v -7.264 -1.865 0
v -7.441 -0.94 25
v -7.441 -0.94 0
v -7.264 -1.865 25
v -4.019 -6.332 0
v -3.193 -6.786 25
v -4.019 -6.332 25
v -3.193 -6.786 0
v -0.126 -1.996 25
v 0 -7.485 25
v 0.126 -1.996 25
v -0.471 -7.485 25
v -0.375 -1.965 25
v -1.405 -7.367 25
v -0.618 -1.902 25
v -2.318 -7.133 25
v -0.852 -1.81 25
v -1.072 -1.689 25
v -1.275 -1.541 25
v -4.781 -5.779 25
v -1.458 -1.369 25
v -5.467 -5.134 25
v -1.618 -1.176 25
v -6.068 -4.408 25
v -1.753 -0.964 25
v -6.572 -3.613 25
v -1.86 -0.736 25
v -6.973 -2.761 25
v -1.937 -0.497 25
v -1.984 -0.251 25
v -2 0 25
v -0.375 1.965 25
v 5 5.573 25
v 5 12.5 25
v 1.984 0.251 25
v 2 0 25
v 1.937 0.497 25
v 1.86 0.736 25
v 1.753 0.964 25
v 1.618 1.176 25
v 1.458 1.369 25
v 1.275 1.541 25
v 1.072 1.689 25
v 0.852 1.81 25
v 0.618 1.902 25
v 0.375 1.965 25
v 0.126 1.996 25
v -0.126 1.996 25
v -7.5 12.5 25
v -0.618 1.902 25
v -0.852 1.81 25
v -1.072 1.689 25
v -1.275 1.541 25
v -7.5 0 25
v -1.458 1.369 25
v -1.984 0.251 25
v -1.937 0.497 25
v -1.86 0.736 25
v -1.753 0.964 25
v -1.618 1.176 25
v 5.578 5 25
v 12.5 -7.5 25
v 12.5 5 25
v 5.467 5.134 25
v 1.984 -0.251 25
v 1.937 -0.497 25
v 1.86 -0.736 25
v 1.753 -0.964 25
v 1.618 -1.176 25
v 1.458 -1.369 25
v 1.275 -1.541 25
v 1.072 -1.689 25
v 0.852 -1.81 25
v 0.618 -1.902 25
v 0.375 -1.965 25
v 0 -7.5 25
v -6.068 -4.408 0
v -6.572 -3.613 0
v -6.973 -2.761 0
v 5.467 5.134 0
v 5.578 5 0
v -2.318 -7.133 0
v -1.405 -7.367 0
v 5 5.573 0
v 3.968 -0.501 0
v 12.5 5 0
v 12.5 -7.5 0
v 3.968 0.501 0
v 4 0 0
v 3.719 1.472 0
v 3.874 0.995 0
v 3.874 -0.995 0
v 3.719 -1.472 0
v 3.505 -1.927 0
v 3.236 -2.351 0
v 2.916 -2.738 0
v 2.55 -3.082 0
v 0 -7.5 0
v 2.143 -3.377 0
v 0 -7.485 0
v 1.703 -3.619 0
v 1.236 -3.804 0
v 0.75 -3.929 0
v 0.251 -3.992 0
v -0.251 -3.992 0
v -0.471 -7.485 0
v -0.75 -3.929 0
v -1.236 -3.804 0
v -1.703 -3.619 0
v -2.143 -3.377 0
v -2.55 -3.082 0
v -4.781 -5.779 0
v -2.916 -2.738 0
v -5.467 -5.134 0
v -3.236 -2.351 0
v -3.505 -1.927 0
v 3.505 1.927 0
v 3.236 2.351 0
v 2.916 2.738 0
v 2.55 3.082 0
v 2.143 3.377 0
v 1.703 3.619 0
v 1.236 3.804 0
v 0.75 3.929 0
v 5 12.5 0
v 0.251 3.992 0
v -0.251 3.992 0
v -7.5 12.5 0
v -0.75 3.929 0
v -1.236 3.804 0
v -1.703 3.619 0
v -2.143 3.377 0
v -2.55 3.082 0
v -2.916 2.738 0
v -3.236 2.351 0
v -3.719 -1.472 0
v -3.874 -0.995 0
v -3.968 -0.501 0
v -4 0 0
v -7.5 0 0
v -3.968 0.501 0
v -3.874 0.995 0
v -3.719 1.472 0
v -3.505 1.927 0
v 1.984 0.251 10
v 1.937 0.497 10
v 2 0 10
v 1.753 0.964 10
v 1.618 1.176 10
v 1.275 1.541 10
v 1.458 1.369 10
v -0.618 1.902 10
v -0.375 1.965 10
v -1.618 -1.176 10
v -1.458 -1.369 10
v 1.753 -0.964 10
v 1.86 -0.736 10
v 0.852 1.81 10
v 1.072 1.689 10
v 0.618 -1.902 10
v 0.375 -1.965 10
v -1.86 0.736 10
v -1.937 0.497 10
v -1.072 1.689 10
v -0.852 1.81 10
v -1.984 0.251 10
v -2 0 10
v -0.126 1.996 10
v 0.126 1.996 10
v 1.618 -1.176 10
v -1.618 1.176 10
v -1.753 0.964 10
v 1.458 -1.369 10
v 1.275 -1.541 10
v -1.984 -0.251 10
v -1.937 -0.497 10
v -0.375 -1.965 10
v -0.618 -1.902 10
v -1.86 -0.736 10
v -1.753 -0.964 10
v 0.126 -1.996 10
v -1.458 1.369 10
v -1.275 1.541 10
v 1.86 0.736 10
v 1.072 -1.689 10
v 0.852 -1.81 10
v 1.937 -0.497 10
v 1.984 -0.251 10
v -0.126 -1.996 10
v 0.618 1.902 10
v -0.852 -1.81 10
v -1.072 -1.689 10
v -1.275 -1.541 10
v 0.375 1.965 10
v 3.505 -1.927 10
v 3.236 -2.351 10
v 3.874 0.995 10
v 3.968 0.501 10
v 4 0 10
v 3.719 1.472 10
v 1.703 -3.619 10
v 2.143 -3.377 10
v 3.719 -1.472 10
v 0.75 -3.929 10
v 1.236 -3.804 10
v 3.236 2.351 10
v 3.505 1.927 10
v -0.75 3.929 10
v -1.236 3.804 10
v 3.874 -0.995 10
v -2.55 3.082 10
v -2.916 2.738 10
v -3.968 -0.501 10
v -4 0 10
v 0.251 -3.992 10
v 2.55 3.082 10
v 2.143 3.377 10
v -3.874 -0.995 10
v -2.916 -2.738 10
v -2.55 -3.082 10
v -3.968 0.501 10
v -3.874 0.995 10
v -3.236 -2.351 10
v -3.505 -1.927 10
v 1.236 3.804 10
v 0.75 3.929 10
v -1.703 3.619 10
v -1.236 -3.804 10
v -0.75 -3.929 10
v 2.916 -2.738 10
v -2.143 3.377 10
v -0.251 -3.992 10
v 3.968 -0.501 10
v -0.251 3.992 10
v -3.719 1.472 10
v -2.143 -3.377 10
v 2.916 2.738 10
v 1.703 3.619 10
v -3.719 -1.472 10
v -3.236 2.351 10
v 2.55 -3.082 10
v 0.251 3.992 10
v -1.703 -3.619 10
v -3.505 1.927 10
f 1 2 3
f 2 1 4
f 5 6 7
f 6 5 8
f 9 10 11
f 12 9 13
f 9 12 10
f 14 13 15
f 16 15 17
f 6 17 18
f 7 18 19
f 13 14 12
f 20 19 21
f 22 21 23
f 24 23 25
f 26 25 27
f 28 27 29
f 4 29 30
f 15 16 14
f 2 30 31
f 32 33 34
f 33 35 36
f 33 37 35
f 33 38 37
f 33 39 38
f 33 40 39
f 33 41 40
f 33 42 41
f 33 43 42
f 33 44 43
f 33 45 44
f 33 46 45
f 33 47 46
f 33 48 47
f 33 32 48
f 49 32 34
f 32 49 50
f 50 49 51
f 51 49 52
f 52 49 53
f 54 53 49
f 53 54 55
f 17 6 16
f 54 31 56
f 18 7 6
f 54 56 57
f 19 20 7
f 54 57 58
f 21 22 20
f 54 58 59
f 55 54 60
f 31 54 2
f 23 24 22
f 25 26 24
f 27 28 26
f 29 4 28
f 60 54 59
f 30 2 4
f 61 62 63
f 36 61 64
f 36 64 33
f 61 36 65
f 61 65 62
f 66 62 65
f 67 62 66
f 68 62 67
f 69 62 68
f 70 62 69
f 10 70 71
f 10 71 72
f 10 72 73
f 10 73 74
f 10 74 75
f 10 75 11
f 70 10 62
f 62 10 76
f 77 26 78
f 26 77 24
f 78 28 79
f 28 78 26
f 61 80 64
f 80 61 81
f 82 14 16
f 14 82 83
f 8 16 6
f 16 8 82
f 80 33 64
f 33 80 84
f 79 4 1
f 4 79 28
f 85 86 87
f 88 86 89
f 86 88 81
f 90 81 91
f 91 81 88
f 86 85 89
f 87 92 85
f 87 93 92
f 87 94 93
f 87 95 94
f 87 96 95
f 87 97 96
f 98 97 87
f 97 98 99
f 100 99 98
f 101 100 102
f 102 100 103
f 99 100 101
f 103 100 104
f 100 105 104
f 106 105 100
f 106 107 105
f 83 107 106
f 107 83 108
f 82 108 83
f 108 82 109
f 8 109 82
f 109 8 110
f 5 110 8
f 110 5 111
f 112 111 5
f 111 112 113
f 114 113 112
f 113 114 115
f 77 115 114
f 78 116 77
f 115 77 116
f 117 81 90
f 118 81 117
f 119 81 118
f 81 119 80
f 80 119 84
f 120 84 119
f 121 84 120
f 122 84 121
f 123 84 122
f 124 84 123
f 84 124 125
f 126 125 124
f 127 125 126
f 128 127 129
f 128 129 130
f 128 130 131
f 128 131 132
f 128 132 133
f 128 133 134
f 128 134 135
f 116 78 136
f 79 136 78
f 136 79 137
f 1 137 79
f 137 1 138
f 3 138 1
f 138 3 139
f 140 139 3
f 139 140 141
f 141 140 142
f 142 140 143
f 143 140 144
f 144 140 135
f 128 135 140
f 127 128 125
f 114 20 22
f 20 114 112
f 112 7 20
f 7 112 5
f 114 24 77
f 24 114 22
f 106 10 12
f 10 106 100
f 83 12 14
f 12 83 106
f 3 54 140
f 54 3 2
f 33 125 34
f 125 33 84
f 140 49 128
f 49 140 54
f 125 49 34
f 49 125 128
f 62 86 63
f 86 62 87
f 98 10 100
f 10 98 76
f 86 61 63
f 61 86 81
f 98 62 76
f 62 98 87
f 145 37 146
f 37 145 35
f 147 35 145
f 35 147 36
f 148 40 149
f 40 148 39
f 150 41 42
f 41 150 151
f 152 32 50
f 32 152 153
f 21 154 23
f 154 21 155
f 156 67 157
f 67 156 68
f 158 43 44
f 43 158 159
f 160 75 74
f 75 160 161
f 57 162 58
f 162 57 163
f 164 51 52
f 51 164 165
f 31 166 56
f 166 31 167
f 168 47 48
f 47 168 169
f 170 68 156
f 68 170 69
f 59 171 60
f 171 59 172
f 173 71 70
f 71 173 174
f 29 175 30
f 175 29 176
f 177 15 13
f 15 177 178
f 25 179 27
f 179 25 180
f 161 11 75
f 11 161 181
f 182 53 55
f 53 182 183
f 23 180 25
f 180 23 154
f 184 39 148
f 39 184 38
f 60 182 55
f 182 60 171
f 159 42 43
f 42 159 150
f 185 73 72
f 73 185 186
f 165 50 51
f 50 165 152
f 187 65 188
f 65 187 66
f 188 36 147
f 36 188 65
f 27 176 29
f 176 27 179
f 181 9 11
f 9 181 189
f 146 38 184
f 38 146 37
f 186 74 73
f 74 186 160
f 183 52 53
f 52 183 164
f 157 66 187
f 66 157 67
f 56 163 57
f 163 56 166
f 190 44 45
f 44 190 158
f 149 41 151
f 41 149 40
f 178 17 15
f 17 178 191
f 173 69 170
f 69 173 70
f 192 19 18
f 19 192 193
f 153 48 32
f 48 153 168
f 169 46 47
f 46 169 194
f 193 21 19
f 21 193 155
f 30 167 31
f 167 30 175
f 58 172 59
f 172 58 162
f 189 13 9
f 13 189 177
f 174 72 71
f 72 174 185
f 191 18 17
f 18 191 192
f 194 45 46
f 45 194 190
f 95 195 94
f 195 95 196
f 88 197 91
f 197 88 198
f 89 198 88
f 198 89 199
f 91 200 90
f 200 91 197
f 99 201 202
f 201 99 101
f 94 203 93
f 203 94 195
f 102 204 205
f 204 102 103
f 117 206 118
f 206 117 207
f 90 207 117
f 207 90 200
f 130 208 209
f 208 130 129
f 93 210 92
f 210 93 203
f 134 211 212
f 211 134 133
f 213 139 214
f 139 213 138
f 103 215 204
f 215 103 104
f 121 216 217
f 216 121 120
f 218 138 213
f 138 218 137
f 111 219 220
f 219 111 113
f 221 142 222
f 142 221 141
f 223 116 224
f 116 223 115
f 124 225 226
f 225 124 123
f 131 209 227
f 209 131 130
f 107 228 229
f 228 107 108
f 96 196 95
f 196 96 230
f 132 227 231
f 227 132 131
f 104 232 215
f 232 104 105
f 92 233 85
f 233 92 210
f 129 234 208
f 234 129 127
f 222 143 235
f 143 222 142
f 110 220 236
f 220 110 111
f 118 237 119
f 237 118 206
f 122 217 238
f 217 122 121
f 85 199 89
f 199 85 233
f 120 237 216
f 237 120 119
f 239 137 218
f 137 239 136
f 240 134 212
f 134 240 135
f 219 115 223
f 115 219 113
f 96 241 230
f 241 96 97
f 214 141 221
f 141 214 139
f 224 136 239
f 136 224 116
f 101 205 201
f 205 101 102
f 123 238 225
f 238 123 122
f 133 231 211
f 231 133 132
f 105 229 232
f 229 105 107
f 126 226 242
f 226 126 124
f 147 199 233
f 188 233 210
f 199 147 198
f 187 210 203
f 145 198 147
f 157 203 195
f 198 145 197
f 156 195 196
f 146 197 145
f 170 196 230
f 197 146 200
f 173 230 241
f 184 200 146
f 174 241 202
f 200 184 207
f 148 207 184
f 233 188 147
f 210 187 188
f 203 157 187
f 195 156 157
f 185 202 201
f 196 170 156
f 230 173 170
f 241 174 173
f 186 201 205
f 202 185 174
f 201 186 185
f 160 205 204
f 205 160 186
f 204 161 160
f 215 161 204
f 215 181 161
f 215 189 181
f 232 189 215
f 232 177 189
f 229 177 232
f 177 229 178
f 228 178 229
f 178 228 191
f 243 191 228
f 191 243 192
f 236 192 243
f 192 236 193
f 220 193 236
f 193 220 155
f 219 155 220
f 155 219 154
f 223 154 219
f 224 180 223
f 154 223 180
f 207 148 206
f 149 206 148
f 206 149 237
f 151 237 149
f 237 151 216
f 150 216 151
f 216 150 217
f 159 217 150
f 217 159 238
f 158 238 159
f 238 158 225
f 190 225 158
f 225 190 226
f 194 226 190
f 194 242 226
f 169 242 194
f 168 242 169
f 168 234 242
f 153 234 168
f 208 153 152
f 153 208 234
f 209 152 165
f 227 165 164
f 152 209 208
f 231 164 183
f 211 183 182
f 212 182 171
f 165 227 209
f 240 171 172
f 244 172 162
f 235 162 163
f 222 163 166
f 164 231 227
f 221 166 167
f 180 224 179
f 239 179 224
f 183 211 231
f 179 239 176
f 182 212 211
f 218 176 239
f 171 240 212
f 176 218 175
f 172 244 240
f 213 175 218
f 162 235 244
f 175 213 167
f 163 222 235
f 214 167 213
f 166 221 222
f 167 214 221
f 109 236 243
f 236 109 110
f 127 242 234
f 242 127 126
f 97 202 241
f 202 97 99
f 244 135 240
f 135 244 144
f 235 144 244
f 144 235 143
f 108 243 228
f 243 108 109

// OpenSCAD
CORNER_DIA = 15;
HEIGHT = 25;
WIDTH = 20;

MOUNT_HOLE_DIA = 4;
MOUNT_HOLE_HEAD_DIA = 8;
MOUNT_HOLE_HEAD_HEIGHT = 10;

$fn = 50;

module standoff() {
  union() {
    w = WIDTH - CORNER_DIA/2;

    cylinder(d = CORNER_DIA, h = HEIGHT);
    translate([-CORNER_DIA/2, 0, 0])
    cube(size = [w, w, HEIGHT]);
    translate([0, -CORNER_DIA/2, 0])
    cube(size = [w, w, HEIGHT]);
  }
}

difference() {
  standoff();
  #cylinder(d = MOUNT_HOLE_DIA, h = HEIGHT);
  #cylinder(d = MOUNT_HOLE_HEAD_DIA, h = MOUNT_HOLE_HEAD_HEIGHT);
}
